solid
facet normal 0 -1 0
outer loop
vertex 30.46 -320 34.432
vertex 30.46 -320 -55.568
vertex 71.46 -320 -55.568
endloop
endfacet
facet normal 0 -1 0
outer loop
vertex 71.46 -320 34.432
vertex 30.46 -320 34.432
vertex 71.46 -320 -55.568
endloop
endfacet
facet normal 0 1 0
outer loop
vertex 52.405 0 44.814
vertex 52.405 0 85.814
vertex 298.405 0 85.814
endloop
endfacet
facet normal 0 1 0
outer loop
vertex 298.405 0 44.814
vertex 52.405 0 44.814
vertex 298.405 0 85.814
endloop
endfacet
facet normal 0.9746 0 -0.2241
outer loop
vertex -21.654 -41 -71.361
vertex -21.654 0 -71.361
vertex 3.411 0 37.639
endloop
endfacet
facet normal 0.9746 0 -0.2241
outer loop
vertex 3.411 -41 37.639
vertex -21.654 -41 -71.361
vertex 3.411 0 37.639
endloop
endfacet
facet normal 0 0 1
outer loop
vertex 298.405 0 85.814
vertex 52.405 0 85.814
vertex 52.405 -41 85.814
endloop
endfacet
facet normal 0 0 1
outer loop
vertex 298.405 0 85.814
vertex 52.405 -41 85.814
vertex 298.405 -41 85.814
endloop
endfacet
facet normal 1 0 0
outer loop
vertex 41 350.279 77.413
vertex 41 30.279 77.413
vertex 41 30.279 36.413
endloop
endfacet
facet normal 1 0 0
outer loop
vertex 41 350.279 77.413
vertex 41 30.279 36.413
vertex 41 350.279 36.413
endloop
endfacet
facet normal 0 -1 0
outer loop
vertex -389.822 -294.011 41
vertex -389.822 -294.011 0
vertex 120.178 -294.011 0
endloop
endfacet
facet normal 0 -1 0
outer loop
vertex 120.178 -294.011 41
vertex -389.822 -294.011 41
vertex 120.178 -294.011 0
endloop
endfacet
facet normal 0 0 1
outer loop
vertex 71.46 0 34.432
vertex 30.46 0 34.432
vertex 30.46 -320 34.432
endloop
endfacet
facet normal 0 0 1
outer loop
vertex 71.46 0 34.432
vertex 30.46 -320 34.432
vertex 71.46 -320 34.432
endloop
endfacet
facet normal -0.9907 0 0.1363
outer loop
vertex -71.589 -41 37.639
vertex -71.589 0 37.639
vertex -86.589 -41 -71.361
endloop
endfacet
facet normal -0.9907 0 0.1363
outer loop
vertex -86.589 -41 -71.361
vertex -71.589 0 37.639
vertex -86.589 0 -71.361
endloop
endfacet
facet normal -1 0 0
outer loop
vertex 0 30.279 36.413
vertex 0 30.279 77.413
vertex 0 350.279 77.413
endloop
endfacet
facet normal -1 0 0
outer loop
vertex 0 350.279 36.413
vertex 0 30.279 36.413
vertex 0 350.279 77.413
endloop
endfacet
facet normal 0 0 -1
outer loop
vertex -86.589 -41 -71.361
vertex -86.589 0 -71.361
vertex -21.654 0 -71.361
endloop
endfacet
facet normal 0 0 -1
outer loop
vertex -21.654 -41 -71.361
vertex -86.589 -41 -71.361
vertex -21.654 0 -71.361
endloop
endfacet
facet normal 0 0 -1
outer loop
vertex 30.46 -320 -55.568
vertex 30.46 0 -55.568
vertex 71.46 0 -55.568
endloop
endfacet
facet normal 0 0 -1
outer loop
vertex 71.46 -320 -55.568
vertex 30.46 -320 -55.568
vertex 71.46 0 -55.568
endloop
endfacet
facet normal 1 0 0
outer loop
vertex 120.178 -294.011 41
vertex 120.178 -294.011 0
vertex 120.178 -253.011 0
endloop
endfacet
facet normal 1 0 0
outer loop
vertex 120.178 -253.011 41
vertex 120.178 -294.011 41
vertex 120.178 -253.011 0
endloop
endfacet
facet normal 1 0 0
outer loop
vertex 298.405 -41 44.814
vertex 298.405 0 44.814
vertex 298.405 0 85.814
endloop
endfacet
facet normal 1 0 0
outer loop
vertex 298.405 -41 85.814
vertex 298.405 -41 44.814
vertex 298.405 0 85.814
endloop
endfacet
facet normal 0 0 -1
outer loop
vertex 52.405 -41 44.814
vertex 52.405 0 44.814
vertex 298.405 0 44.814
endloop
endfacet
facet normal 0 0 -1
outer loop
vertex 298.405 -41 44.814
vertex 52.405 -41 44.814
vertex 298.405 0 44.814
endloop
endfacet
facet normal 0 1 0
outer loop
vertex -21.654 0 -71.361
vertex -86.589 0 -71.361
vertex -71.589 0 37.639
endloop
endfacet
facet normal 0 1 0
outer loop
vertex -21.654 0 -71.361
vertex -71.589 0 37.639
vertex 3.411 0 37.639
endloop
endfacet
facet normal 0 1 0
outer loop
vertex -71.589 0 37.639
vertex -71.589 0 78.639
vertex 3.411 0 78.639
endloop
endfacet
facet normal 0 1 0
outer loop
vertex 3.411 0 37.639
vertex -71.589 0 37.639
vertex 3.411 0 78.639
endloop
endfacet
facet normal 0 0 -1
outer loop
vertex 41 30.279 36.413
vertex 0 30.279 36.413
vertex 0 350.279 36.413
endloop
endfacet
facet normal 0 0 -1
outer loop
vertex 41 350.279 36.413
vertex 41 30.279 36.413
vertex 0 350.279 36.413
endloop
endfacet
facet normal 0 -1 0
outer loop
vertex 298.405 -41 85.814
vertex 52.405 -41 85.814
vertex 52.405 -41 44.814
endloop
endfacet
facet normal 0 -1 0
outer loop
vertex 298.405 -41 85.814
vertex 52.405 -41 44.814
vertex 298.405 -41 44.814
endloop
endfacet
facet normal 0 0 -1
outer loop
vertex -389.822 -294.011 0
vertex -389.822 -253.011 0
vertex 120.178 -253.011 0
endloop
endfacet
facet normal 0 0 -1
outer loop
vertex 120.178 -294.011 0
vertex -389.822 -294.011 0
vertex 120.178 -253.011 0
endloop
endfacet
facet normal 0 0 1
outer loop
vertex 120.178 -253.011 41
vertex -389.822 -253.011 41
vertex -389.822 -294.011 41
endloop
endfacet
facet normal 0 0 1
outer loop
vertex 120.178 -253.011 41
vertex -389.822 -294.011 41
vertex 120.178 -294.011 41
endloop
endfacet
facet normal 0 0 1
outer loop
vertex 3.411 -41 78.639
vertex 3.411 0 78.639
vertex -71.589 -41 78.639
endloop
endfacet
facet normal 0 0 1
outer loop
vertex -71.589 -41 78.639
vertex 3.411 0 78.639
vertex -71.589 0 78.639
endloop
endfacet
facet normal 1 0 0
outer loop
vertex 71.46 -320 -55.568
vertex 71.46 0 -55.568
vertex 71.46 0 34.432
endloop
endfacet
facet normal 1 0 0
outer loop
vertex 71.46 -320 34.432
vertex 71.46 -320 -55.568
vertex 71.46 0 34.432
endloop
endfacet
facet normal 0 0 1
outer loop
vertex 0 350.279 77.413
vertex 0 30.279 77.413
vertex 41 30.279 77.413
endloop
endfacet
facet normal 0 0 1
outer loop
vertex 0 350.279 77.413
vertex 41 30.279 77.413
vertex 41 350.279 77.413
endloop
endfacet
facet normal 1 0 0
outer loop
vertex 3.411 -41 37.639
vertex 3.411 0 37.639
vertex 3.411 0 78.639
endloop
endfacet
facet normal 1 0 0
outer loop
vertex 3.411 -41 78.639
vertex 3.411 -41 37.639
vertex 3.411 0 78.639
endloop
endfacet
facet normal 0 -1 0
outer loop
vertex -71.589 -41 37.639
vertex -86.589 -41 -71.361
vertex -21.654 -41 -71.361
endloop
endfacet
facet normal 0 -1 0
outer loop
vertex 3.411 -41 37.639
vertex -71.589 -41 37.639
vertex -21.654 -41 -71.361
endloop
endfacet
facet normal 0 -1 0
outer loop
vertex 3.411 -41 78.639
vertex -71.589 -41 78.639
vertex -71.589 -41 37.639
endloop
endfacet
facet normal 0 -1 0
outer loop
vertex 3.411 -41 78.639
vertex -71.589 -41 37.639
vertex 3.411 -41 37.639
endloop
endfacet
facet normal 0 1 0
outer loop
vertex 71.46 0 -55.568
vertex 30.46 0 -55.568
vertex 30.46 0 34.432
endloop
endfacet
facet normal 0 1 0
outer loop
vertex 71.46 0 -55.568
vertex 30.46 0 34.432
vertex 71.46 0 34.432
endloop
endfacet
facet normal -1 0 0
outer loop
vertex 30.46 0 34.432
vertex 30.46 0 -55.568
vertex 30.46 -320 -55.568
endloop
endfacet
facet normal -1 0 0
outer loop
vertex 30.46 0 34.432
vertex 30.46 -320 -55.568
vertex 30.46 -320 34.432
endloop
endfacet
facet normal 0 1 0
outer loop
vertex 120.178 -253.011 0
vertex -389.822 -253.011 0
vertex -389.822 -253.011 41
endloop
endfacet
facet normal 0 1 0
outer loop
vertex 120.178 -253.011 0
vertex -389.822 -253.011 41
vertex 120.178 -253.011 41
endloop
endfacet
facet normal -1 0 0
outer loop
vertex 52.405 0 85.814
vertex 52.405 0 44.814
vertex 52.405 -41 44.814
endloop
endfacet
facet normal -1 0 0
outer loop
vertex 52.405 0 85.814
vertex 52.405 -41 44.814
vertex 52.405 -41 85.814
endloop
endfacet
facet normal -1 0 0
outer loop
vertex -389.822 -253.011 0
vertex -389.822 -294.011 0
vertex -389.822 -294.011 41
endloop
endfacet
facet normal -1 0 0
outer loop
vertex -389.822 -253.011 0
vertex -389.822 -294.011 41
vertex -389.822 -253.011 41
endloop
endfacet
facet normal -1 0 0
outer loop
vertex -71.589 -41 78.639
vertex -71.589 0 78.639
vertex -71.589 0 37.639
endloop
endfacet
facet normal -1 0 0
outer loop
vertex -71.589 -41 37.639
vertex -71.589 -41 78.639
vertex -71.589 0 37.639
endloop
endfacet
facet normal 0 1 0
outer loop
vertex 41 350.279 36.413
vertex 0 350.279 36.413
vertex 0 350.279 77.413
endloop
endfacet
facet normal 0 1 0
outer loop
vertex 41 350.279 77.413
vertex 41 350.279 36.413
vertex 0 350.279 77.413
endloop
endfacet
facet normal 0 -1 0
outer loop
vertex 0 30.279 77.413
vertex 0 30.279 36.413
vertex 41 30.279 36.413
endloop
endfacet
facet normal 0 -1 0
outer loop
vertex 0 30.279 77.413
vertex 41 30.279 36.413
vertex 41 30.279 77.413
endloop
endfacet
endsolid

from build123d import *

# Parameters (mm, degrees)
F1_DEPTH = 41
F2_W     = 246
F2_H     = 41
F3_DEPTH = 41
F4_W     = 320
F4_H     = 41
F5_DEPTH = 41
F6_W     = 510
F6_H     = 41
F7_DEPTH = 41
F8_W     = 41
F8_H     = 90
F9_DEPTH = 320


with BuildPart() as f1:
    # F0 (on Front) → F1 (new body)
    with BuildSketch(Plane.XZ):
        Polygon((3.41058, 78.639174), (-71.58942, 78.639174), (-71.58942, 37.639174), (-86.58942, -71.360826), (-21.654289, -71.360826), (3.41058, 37.639174), align=None)
    extrude(amount=F1_DEPTH)


with BuildPart() as f3:
    # F2 (on Front) → F3 (new body)
    with BuildSketch(Plane.XZ):
        with Locations((175.404556, 65.313812)):
            Rectangle(F2_W, F2_H)
    extrude(amount=F3_DEPTH)


with BuildPart() as f5:
    # F4 (on Right) → F5 (new body)
    with BuildSketch(Plane.YZ):
        with Locations((190.279366, 56.91339)):
            Rectangle(F4_W, F4_H)
    extrude(amount=F5_DEPTH)


with BuildPart() as f7:
    # F6 (on Top) → F7 (new body)
    with BuildSketch(Plane.XY):
        with Locations((-134.822284, -273.51135)):
            Rectangle(F6_W, F6_H)
    extrude(amount=F7_DEPTH)


with BuildPart() as f9:
    # F8 (on Front) → F9 (new body)
    with BuildSketch(Plane.XZ):
        with Locations((50.960384, -10.567618)):
            Rectangle(F8_W, F8_H)
    extrude(amount=F9_DEPTH)


solid = Compound([f1.part, f3.part, f5.part, f7.part, f9.part])
